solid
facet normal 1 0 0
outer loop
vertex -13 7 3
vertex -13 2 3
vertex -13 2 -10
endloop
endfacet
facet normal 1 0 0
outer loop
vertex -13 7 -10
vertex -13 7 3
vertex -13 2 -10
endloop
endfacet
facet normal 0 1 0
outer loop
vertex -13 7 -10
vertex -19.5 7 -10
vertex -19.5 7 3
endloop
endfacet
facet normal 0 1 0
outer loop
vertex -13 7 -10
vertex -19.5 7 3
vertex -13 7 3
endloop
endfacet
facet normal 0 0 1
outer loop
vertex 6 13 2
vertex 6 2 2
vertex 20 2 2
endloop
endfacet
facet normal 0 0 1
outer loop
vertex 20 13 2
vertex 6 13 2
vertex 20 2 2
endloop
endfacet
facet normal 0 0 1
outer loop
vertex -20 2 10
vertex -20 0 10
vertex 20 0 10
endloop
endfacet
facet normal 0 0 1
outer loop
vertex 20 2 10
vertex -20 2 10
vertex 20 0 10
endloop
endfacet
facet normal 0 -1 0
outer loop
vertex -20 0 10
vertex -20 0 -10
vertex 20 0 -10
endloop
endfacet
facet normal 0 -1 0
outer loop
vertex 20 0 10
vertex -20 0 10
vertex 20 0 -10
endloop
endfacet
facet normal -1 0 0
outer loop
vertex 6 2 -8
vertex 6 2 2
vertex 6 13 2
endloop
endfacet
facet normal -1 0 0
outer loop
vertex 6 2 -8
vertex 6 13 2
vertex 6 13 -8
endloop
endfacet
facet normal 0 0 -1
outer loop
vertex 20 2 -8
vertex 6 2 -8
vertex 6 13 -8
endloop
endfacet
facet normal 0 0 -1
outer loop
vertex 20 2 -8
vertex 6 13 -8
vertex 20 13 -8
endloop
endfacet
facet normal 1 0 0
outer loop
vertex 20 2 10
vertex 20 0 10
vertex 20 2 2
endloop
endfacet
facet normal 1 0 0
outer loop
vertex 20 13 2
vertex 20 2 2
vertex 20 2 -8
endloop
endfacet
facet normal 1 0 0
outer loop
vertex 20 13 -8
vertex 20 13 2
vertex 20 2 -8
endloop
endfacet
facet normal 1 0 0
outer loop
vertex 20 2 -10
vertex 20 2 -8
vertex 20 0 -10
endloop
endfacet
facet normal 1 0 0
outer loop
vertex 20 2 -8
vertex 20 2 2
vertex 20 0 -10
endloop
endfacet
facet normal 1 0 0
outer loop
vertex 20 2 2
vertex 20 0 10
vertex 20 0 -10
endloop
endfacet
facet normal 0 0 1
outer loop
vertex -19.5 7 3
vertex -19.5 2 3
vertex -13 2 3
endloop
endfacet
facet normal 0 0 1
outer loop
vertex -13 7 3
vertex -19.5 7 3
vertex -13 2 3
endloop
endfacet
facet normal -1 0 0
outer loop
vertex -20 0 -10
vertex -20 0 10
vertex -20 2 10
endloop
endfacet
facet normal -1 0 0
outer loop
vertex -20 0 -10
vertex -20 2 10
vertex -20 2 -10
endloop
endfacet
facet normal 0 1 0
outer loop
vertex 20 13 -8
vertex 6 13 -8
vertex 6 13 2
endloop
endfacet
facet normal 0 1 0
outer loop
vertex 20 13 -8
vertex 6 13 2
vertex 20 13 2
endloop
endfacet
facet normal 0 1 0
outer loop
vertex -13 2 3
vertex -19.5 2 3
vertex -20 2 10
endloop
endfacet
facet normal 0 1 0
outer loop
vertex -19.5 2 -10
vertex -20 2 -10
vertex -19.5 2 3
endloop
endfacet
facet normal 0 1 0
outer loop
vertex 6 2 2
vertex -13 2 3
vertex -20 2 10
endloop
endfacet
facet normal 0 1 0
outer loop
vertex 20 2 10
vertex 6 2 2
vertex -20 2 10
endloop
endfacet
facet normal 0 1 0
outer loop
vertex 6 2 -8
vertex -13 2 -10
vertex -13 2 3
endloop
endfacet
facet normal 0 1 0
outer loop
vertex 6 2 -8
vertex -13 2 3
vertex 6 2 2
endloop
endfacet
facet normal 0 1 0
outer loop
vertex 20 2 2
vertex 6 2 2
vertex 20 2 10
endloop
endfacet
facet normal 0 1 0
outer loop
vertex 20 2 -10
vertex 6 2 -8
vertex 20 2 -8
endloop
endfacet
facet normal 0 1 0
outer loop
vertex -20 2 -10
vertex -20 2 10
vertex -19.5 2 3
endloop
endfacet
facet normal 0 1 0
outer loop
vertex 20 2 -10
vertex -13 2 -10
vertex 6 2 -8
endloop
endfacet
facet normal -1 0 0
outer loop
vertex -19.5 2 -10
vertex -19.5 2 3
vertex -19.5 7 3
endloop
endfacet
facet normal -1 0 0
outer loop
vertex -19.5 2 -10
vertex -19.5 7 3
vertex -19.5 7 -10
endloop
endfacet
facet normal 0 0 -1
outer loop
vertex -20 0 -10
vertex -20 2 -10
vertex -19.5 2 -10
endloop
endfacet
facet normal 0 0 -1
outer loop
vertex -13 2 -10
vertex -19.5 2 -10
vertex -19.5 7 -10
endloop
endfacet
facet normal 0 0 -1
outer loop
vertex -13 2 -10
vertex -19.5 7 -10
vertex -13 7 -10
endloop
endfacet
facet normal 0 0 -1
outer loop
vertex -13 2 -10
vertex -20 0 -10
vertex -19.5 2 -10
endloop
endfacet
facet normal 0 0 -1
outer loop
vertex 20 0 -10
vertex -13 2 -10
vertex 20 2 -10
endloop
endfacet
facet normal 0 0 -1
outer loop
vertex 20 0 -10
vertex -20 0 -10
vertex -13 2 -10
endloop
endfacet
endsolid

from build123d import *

# Parameters (mm, degrees)
SKETCH1_W           = 40
SKETCH1_H           = 20
BOSS_EXTRUDE1_DEPTH = 2
SKETCH2_W           = 14
SKETCH2_H           = 10
BOSS_EXTRUDE2_DEPTH = 11
SKETCH3_W           = 6.5
SKETCH3_H           = 13
BOSS_EXTRUDE3_DEPTH = 5


with BuildPart() as part:
    # Sketch1 → Boss-Extrude1 (new body)
    with BuildSketch(Plane(origin=(0, 0, 0), x_dir=(1, 0, 0), z_dir=(0, 1, 0))):
        Rectangle(SKETCH1_W, SKETCH1_H)
    extrude(amount=BOSS_EXTRUDE1_DEPTH)

    # Sketch2 → Boss-Extrude2 (add)
    with BuildSketch(Plane(origin=(0, 2, 0), x_dir=(1, 0, 0), z_dir=(0, 1, 0))):
        with Locations((13, 3)):
            Rectangle(SKETCH2_W, SKETCH2_H)
    extrude(amount=BOSS_EXTRUDE2_DEPTH)

    # Sketch3 → Boss-Extrude3 (add)
    with BuildSketch(Plane(origin=(0, 2, 0), x_dir=(1, 0, 0), z_dir=(0, 1, 0))):
        with Locations((-16.25, 3.5)):
            Rectangle(SKETCH3_W, SKETCH3_H)
    extrude(amount=BOSS_EXTRUDE3_DEPTH)


solid = part.part
